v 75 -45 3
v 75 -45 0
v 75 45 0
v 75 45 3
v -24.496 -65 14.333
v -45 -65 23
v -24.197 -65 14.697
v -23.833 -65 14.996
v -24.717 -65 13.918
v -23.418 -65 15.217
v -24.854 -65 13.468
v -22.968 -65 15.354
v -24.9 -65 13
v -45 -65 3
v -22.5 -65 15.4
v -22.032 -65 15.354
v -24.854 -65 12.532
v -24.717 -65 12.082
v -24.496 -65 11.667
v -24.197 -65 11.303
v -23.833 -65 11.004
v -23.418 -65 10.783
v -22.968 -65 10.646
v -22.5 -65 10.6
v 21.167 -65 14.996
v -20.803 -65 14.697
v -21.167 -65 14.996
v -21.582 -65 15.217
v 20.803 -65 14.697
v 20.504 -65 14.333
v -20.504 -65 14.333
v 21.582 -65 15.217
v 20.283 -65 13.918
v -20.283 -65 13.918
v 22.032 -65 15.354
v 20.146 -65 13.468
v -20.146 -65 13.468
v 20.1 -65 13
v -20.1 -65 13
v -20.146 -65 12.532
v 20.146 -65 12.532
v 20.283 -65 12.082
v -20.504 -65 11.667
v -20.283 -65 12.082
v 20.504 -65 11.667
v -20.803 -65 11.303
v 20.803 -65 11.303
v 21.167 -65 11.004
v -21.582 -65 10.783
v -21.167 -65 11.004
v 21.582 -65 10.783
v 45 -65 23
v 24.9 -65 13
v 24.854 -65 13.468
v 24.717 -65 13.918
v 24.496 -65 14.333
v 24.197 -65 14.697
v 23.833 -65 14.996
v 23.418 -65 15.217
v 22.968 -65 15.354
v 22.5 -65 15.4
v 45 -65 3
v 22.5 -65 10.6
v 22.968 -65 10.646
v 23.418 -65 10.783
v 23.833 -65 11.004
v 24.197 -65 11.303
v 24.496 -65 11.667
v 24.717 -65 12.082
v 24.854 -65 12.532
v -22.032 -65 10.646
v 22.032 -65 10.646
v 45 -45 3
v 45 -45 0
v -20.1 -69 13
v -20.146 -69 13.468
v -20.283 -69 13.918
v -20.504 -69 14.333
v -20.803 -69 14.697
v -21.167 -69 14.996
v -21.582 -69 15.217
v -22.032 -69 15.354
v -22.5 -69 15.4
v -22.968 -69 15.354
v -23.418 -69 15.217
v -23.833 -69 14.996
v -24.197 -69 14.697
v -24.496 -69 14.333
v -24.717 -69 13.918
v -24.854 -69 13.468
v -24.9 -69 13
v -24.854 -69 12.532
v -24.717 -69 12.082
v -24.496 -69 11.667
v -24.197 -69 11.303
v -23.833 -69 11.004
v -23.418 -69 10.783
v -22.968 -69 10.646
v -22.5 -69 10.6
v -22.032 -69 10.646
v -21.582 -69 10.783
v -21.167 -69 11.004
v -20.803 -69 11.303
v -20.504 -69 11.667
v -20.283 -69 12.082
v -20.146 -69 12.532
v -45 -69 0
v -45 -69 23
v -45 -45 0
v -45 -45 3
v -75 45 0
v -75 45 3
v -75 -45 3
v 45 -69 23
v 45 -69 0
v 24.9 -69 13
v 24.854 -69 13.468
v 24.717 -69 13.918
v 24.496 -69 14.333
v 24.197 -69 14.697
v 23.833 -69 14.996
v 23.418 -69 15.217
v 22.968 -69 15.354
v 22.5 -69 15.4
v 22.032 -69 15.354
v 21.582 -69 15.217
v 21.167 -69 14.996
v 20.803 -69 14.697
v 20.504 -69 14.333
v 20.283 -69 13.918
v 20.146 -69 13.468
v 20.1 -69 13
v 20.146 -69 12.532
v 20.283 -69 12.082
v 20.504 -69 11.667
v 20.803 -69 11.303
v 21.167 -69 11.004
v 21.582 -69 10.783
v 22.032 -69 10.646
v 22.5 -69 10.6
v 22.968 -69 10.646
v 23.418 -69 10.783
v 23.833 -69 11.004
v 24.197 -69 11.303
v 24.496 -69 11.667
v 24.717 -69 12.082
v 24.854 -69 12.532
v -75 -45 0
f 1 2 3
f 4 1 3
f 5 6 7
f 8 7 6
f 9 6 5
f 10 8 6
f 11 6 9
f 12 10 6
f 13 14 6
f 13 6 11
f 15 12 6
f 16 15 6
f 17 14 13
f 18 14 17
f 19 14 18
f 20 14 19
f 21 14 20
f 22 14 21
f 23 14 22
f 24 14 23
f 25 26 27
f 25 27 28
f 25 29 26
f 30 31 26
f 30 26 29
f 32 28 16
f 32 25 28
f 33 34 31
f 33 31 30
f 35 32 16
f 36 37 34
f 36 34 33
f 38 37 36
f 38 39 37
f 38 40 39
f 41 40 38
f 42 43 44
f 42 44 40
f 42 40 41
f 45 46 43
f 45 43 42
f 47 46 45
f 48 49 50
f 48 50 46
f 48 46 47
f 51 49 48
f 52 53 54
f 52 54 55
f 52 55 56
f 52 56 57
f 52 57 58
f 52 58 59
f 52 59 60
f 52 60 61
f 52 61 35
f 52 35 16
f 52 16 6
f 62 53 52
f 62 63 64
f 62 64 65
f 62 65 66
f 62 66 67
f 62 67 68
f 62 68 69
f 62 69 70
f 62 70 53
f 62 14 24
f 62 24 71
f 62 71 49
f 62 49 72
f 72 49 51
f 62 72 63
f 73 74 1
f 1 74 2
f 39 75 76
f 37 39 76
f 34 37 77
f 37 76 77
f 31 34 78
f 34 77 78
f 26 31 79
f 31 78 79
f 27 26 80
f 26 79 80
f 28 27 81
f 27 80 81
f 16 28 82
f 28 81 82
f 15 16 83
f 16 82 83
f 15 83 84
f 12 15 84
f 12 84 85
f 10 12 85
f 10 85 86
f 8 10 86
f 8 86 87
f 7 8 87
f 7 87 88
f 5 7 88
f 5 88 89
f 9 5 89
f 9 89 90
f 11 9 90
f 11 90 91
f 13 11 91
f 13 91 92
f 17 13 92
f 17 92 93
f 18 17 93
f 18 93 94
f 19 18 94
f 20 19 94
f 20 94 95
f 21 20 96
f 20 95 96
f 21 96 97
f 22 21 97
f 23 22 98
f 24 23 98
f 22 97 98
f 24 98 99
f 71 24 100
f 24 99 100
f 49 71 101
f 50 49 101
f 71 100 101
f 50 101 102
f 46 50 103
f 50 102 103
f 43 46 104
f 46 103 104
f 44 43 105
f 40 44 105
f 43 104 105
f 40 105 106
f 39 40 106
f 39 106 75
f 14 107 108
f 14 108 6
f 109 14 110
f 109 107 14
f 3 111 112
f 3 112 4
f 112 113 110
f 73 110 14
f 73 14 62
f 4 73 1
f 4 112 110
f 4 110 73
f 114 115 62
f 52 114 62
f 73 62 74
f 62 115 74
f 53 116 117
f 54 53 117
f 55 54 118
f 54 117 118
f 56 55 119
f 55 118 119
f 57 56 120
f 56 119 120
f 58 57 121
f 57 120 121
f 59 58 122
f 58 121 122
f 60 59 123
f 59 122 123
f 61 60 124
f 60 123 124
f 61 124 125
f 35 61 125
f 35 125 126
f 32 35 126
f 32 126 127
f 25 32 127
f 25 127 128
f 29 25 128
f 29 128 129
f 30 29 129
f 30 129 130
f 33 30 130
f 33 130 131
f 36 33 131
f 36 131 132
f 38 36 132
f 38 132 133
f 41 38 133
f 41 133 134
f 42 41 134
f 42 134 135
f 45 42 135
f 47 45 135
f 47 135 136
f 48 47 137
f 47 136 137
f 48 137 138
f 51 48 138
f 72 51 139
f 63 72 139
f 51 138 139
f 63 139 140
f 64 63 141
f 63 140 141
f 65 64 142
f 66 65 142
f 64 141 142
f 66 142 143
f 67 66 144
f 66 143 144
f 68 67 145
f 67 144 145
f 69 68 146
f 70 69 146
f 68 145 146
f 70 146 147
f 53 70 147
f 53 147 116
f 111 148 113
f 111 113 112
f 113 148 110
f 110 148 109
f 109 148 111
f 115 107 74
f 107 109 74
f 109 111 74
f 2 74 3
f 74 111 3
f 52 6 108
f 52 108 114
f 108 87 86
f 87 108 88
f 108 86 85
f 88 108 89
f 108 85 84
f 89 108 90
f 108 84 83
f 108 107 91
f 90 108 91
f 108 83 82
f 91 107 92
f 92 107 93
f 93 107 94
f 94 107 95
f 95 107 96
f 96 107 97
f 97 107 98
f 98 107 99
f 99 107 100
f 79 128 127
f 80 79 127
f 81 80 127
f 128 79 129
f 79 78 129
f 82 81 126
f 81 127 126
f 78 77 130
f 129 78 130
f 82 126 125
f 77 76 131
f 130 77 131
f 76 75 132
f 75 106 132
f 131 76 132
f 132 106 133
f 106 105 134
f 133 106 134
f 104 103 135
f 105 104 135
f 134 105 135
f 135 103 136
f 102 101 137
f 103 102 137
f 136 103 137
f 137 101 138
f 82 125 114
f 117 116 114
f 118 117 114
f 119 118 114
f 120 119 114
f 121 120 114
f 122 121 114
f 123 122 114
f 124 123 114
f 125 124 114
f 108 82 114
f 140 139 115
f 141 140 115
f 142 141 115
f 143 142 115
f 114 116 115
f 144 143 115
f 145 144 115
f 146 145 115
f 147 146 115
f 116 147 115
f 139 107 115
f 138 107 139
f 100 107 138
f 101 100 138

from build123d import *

# Parameters (mm, degrees)
SKETCH_1_W          = 150
SKETCH_1_H          = 90
EXTRUDE_1_DEPTH     = 3
SKETCH_2_W          = 90
SKETCH_2_H          = 20
EXTRUDE_2_DEPTH     = 3
SKETCH_3_W          = 90
SKETCH_3_H          = 4
EXTRUDE_3_DEPTH     = 23
CUT_EXTRUDE_1_REACH = 116
SKETCH_4_R          = 2.4


with BuildPart() as part:
    # 스케치1 → 보스-돌출1 (new body)
    with BuildSketch(Plane.XY):
        Rectangle(SKETCH_1_W, SKETCH_1_H)
    extrude(amount=EXTRUDE_1_DEPTH)

    # 스케치2 → 보스-돌출2 (add)
    with BuildSketch(Plane.XY):
        with Locations((0, -55)):
            Rectangle(SKETCH_2_W, SKETCH_2_H)
    extrude(amount=EXTRUDE_2_DEPTH)

    # 스케치3 → 보스-돌출3 (add)
    with BuildSketch(Plane.XY):
        with Locations((0, -67)):
            Rectangle(SKETCH_3_W, SKETCH_3_H)
    extrude(amount=EXTRUDE_3_DEPTH)

    # 스케치4 → 컷-돌출1 (cut, up to next)
    with BuildSketch(Plane.XZ.offset(69), mode=Mode.PRIVATE) as cut_extrude_1_sk1:
        with Locations((-22.5, 13)):
            Circle(SKETCH_4_R)
    cut_extrude_1_tool1 = extrude(cut_extrude_1_sk1.sketch, amount=-CUT_EXTRUDE_1_REACH, mode=Mode.PRIVATE) & part.part
    add(cut_extrude_1_tool1.solids().sort_by_distance((-22.5, -69, 13))[0], mode=Mode.SUBTRACT)
    # 스케치4 → 컷-돌출1 (cut, up to next)
    with BuildSketch(Plane.XZ.offset(69), mode=Mode.PRIVATE) as cut_extrude_1_sk2:
        with Locations((22.5, 13)):
            Circle(SKETCH_4_R)
    cut_extrude_1_tool2 = extrude(cut_extrude_1_sk2.sketch, amount=-CUT_EXTRUDE_1_REACH, mode=Mode.PRIVATE) & part.part
    add(cut_extrude_1_tool2.solids().sort_by_distance((22.5, -69, 13))[0], mode=Mode.SUBTRACT)


solid = part.part
